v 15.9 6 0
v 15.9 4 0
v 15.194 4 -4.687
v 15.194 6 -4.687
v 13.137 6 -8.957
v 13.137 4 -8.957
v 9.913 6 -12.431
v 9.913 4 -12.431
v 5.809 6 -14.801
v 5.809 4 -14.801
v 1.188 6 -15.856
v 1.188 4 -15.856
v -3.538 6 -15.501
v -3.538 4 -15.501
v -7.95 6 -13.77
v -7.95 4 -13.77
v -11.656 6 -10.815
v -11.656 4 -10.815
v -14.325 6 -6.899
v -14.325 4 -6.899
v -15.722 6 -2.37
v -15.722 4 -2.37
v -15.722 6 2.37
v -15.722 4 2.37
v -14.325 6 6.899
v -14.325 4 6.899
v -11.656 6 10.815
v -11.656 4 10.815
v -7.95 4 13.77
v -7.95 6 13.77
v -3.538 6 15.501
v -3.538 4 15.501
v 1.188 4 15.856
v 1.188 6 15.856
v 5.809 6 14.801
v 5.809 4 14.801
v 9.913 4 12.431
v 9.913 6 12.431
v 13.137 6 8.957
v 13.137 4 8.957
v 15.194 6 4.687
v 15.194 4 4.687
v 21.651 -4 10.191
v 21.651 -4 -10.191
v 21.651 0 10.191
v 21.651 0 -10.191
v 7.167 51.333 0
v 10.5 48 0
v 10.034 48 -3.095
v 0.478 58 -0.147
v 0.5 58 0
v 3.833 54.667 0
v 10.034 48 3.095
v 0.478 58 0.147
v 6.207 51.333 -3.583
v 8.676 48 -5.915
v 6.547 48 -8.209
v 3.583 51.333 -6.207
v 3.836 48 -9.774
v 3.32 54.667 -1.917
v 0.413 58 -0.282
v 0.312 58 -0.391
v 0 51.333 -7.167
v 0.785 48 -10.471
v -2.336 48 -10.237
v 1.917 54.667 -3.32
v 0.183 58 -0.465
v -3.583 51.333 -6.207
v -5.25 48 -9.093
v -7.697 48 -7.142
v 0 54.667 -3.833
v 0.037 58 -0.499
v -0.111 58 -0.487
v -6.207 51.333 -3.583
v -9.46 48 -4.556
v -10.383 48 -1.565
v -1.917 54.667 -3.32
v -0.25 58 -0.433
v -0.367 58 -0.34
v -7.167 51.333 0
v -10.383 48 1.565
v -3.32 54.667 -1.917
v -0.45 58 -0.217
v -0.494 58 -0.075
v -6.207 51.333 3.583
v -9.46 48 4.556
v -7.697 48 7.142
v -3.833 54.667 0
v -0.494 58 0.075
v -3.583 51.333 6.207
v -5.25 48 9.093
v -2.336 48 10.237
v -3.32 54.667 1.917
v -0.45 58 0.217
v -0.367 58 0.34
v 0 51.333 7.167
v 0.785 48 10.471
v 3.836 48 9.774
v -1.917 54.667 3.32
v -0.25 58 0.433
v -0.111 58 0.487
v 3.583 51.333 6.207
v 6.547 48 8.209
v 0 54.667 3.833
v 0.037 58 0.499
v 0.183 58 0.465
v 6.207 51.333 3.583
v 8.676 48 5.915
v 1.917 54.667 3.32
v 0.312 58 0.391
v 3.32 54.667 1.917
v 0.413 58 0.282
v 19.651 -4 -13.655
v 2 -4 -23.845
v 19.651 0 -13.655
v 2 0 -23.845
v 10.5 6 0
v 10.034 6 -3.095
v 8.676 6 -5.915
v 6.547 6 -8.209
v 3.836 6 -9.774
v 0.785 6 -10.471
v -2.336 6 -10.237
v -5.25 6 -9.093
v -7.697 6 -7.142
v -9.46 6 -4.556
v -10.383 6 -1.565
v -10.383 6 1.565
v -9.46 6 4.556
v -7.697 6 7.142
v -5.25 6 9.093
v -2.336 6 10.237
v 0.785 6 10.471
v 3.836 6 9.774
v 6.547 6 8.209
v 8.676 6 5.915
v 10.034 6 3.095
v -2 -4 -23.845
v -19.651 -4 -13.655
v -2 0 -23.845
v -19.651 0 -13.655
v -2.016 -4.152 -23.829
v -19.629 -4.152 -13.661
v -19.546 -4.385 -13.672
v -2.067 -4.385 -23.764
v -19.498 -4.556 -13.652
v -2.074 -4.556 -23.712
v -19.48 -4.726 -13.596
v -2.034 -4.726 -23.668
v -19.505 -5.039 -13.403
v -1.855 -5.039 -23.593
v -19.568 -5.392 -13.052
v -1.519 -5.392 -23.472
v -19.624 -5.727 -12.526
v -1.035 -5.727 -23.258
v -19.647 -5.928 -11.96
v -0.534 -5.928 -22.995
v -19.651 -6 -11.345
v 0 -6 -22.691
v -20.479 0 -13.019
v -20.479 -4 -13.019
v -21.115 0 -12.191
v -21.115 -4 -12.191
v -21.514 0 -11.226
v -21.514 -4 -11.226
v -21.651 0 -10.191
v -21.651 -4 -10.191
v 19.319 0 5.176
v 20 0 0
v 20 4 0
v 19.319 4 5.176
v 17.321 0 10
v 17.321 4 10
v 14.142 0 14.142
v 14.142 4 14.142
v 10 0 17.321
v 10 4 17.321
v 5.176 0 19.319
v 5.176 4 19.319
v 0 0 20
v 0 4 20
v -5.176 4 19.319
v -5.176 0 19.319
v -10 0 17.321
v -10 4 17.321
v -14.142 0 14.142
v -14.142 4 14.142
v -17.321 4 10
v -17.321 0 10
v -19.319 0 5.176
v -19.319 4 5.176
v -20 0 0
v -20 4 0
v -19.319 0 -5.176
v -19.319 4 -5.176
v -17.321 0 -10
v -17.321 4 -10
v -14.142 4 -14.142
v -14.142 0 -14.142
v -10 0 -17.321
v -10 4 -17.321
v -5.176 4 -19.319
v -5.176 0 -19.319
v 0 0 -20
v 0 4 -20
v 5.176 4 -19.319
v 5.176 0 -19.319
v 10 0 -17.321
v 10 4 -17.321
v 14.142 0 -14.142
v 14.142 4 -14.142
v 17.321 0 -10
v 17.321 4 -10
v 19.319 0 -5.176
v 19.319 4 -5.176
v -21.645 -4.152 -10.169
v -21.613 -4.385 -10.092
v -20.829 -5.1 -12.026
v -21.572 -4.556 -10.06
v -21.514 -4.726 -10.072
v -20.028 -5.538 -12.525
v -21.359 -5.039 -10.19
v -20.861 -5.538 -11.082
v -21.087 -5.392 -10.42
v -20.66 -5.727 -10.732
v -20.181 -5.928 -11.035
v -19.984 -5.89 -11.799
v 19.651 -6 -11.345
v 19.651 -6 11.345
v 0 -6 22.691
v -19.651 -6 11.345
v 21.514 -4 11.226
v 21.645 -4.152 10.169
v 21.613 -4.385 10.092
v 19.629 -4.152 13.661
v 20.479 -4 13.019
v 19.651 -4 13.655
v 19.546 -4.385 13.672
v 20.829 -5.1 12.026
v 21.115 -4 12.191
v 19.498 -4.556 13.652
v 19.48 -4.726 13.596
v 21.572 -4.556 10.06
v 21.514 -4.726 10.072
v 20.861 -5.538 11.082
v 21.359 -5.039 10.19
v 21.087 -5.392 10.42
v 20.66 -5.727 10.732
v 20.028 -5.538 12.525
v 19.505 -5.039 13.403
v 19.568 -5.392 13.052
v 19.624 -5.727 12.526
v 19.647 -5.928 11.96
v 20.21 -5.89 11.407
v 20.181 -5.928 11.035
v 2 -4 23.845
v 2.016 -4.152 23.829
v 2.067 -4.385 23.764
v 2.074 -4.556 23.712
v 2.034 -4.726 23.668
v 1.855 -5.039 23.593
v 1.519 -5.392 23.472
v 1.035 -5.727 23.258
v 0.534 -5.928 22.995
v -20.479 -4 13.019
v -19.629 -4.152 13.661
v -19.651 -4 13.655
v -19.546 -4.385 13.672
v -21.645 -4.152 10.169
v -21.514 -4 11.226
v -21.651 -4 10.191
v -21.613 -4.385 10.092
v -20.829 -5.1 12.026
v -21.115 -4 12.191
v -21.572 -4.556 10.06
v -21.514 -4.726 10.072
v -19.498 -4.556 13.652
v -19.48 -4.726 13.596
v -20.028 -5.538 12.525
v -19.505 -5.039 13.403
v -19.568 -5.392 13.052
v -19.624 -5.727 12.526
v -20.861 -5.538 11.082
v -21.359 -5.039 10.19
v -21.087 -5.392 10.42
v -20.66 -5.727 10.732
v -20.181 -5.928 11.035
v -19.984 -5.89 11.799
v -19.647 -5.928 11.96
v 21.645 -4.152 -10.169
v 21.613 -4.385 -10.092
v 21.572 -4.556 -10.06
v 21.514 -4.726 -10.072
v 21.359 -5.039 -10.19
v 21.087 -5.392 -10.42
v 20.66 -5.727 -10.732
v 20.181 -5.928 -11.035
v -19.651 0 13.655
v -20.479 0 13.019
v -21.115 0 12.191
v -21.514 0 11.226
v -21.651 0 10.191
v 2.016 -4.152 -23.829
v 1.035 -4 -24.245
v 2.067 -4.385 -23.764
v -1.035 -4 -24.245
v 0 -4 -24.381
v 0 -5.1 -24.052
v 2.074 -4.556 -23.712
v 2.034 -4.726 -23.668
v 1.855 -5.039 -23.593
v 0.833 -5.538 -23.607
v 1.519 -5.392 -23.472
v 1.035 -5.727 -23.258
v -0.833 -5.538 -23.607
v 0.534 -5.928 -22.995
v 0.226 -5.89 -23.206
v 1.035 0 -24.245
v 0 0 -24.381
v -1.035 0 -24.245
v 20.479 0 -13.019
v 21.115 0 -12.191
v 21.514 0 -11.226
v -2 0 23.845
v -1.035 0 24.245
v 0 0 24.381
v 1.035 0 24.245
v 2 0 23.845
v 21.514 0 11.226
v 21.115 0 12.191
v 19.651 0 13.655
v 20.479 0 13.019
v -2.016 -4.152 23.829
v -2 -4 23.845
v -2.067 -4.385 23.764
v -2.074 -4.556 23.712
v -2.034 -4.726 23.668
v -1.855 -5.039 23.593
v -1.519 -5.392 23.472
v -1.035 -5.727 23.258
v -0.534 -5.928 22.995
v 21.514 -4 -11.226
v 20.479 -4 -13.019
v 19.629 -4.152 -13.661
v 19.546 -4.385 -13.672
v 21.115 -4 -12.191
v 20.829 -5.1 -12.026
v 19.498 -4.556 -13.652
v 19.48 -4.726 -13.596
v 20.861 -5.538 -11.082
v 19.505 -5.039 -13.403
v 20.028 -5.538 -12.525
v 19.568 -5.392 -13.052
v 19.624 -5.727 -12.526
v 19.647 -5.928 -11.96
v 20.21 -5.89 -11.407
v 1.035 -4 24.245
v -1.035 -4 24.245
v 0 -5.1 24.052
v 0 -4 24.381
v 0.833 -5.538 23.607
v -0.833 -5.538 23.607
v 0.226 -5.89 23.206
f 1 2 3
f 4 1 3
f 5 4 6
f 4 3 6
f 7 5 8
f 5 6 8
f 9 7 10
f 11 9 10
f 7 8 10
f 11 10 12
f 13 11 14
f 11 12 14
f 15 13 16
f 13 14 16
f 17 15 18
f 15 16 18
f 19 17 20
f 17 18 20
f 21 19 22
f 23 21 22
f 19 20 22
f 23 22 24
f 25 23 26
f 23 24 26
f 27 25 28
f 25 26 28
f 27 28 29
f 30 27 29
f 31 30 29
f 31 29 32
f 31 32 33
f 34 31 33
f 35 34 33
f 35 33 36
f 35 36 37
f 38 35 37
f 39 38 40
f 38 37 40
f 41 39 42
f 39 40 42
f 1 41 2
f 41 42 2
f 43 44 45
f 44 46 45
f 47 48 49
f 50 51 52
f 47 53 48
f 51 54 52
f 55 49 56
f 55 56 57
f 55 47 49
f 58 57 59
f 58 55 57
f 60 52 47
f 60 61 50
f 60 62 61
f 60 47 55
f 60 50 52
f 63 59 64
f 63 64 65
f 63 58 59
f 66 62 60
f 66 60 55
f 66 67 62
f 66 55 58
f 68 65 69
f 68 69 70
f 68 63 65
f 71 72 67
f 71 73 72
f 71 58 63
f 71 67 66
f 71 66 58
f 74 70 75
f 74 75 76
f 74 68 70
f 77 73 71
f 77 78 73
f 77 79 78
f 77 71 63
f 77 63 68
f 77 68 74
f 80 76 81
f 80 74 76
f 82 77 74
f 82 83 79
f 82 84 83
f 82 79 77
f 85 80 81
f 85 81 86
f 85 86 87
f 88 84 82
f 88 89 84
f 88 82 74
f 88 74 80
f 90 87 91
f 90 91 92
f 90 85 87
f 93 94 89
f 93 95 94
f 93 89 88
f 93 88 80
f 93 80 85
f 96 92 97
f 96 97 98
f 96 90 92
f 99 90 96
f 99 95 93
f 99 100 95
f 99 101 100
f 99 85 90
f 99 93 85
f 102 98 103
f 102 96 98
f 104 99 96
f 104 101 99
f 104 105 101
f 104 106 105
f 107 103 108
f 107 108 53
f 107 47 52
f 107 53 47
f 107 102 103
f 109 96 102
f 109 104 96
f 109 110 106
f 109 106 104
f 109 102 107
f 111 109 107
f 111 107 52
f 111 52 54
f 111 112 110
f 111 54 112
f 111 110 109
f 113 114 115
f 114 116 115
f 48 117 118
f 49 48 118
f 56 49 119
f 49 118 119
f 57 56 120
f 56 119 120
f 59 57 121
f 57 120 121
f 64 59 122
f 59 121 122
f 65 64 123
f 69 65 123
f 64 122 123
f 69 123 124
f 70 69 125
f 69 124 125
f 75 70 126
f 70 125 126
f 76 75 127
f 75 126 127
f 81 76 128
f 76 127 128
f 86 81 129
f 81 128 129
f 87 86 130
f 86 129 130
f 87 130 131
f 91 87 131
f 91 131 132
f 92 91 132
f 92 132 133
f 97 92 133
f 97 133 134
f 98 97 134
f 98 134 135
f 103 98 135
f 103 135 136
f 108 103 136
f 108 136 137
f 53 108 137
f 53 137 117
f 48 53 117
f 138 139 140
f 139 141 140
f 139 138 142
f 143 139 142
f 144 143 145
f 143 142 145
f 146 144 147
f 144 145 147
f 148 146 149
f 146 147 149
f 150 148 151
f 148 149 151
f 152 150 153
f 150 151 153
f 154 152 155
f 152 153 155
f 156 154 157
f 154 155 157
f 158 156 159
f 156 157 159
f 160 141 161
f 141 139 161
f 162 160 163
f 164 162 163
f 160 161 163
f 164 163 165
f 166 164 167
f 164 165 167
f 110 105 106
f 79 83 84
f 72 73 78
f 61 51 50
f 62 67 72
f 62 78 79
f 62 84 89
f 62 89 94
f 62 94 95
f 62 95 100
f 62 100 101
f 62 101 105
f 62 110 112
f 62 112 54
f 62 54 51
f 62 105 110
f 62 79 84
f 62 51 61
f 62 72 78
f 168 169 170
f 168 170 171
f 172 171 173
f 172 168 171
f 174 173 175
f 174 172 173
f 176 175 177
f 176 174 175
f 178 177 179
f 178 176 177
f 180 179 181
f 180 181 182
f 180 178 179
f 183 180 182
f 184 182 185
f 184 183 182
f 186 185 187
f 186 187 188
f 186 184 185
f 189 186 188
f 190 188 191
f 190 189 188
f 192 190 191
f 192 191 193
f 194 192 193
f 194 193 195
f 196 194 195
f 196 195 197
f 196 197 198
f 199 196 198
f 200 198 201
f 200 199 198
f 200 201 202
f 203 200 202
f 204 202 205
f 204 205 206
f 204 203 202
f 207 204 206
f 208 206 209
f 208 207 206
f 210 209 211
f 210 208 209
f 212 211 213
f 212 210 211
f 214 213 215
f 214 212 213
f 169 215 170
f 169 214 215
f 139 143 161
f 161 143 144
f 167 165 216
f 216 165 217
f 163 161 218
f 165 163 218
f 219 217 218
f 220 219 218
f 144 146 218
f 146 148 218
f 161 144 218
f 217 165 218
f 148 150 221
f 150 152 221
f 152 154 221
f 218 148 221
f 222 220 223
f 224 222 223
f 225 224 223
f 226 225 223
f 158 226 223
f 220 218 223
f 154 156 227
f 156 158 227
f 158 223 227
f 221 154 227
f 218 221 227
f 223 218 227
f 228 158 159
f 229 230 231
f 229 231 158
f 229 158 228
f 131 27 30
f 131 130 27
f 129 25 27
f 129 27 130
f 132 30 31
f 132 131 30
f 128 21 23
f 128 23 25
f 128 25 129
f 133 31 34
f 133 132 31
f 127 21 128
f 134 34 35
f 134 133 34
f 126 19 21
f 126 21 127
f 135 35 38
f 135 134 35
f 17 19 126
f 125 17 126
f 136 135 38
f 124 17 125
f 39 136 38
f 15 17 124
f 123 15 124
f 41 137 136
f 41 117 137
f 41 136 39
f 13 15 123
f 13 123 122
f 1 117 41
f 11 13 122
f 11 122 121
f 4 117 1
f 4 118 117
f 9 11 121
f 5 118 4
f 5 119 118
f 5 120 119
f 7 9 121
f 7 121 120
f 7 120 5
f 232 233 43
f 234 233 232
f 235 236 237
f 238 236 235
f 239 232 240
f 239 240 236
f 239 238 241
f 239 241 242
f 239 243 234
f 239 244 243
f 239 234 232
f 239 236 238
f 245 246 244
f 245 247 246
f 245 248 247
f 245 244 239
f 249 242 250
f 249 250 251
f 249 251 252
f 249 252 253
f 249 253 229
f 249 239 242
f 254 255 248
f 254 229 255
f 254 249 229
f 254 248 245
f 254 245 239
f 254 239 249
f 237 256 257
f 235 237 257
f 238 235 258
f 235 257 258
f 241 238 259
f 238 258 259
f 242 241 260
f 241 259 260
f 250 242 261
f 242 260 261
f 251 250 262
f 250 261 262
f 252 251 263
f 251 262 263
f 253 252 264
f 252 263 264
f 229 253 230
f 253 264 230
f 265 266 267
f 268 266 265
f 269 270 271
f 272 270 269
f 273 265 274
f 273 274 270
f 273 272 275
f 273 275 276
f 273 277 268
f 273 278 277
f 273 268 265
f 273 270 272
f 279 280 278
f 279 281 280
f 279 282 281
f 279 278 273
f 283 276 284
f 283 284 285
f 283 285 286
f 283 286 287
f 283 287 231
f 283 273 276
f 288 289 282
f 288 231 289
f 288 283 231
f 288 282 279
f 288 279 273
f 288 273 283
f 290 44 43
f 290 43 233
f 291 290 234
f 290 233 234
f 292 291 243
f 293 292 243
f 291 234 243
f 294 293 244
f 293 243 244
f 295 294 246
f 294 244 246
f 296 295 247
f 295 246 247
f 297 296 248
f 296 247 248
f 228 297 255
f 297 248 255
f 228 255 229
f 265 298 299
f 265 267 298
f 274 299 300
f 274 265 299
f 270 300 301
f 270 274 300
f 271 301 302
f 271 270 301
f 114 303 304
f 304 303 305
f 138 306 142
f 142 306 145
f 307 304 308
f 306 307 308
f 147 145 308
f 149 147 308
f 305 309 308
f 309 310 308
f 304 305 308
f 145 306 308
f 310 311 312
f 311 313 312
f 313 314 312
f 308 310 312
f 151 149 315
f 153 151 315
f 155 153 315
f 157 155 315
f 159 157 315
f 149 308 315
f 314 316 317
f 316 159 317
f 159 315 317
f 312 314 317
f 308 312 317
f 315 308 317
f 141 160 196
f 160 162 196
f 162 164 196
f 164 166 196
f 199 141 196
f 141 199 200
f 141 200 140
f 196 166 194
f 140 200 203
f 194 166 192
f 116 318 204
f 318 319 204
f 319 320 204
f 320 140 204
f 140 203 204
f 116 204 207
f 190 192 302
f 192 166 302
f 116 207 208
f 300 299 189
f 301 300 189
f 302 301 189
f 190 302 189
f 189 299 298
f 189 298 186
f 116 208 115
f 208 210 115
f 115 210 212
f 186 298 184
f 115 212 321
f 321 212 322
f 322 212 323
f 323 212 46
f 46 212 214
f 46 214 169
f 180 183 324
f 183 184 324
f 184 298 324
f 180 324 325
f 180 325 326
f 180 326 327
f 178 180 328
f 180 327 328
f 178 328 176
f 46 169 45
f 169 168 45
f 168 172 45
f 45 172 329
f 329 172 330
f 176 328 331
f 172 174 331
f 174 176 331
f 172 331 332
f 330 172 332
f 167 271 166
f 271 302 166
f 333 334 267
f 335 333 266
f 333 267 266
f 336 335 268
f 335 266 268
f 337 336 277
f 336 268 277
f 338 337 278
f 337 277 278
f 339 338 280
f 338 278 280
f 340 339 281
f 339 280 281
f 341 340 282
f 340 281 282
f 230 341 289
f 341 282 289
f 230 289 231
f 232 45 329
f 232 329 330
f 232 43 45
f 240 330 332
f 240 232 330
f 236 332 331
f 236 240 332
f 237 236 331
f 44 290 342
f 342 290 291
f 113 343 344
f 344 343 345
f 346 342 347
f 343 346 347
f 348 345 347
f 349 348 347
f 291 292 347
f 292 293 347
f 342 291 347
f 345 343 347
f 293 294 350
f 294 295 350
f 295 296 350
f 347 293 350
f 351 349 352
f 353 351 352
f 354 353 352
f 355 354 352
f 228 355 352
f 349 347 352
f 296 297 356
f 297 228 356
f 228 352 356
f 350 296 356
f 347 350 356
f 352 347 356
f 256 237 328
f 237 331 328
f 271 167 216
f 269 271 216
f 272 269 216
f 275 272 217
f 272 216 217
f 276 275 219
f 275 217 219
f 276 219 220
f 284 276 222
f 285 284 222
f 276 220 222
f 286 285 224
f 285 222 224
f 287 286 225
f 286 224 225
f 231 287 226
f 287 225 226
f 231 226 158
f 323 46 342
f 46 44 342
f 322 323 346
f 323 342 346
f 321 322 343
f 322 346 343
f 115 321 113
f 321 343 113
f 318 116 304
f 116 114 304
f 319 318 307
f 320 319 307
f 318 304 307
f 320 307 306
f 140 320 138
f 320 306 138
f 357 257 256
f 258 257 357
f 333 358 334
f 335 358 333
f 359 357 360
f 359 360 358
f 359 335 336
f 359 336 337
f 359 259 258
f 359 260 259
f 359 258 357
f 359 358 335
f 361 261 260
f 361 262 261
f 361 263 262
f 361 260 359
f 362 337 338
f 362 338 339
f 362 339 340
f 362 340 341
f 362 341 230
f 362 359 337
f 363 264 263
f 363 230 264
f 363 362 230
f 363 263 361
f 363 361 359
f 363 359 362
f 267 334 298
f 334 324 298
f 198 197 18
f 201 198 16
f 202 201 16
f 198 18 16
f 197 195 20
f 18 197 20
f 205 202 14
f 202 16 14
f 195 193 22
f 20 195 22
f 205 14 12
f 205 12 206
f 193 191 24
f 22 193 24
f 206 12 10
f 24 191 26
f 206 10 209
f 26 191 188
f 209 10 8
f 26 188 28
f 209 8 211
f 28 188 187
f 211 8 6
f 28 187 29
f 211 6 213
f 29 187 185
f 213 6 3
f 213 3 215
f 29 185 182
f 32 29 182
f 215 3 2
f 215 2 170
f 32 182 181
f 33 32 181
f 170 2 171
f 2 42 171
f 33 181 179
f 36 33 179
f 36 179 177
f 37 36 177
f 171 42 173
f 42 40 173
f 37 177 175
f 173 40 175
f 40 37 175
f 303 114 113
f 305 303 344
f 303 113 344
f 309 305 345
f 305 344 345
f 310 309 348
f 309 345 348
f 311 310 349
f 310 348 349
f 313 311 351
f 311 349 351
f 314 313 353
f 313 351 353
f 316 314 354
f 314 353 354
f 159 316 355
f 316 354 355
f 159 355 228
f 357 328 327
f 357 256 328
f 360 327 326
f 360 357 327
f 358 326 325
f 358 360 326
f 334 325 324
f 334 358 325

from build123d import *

# Parameters (mm, degrees)
PAD001_DEPTH = 6
SKETCH003_R  = 20
PAD002_DEPTH = 4
SKETCH004_R  = 15.9
PAD003_DEPTH = 2
SKETCH005_R  = 10.5
PAD004_DEPTH = 15
SKETCH006_R  = 10.5
PAD005_DEPTH = 37
CHAMFER_SIZE = 10
FILLET002_R  = 2
FILLET003_R  = 4


with BuildPart() as part:
    # Sketch002 → Pad001 (new body)
    with BuildSketch(Plane.XZ):
        Polygon((21.650635, -12.5), (21.650635, 12.5), (0, 25), (-21.650635, 12.5), (-21.650635, -12.5), (0, -25), align=None)
    extrude(amount=PAD001_DEPTH)

    # Sketch003 → Pad002 (join)
    with BuildSketch(Plane.XZ):
        Circle(SKETCH003_R)
    extrude(amount=-PAD002_DEPTH)

    # Sketch004 (on Face10 of Pad002) → Pad003 (join)
    with BuildSketch(Plane(origin=(0, 4, 0), x_dir=(1, 0, 0), z_dir=(0, 1, 0))):
        Circle(SKETCH004_R)
    extrude(amount=PAD003_DEPTH)

    # Sketch005 (on Face12 of Pad003) → Pad004 (join)
    with BuildSketch(Plane(origin=(0, 6, 0), x_dir=(1, 0, 0), z_dir=(0, 1, 0))):
        Circle(SKETCH005_R)
    extrude(amount=PAD004_DEPTH)

    # Sketch006 (on Face14 of Pad004) → Pad005 (join)
    with BuildSketch(Plane(origin=(0, 21, 0), x_dir=(1, 0, 0), z_dir=(0, 1, 0))):
        Circle(SKETCH006_R)
    extrude(amount=PAD005_DEPTH)

    # Chamfer
    chamfer_edges = [part.edges().sort_by_distance(p)[0] for p in [
        (-10.5, 58, 0),
    ]]
    chamfer(chamfer_edges, length=CHAMFER_SIZE)

    # Fillet002
    fillet002_edges = [part.edges().sort_by_distance(p)[0] for p in [
        (-10.825318, -6, -18.75),
        (-21.650635, -6, 0),
        (-10.825318, -6, 18.75),
        (10.825318, -6, 18.75),
        (21.650635, -6, 0),
        (10.825318, -6, -18.75),
    ]]
    fillet(fillet002_edges, radius=FILLET002_R)

    # Fillet003
    fillet003_edges = [part.edges().sort_by_distance(p)[0] for p in [
        (0, -2, -25),
        (21.650635, -2, -12.5),
        (21.650635, -2, 12.5),
        (-21.650635, -2, -12.5),
        (-21.650635, -2, 12.5),
        (0, -2, 25),
    ]]
    fillet(fillet003_edges, radius=FILLET003_R)


solid = part.part
